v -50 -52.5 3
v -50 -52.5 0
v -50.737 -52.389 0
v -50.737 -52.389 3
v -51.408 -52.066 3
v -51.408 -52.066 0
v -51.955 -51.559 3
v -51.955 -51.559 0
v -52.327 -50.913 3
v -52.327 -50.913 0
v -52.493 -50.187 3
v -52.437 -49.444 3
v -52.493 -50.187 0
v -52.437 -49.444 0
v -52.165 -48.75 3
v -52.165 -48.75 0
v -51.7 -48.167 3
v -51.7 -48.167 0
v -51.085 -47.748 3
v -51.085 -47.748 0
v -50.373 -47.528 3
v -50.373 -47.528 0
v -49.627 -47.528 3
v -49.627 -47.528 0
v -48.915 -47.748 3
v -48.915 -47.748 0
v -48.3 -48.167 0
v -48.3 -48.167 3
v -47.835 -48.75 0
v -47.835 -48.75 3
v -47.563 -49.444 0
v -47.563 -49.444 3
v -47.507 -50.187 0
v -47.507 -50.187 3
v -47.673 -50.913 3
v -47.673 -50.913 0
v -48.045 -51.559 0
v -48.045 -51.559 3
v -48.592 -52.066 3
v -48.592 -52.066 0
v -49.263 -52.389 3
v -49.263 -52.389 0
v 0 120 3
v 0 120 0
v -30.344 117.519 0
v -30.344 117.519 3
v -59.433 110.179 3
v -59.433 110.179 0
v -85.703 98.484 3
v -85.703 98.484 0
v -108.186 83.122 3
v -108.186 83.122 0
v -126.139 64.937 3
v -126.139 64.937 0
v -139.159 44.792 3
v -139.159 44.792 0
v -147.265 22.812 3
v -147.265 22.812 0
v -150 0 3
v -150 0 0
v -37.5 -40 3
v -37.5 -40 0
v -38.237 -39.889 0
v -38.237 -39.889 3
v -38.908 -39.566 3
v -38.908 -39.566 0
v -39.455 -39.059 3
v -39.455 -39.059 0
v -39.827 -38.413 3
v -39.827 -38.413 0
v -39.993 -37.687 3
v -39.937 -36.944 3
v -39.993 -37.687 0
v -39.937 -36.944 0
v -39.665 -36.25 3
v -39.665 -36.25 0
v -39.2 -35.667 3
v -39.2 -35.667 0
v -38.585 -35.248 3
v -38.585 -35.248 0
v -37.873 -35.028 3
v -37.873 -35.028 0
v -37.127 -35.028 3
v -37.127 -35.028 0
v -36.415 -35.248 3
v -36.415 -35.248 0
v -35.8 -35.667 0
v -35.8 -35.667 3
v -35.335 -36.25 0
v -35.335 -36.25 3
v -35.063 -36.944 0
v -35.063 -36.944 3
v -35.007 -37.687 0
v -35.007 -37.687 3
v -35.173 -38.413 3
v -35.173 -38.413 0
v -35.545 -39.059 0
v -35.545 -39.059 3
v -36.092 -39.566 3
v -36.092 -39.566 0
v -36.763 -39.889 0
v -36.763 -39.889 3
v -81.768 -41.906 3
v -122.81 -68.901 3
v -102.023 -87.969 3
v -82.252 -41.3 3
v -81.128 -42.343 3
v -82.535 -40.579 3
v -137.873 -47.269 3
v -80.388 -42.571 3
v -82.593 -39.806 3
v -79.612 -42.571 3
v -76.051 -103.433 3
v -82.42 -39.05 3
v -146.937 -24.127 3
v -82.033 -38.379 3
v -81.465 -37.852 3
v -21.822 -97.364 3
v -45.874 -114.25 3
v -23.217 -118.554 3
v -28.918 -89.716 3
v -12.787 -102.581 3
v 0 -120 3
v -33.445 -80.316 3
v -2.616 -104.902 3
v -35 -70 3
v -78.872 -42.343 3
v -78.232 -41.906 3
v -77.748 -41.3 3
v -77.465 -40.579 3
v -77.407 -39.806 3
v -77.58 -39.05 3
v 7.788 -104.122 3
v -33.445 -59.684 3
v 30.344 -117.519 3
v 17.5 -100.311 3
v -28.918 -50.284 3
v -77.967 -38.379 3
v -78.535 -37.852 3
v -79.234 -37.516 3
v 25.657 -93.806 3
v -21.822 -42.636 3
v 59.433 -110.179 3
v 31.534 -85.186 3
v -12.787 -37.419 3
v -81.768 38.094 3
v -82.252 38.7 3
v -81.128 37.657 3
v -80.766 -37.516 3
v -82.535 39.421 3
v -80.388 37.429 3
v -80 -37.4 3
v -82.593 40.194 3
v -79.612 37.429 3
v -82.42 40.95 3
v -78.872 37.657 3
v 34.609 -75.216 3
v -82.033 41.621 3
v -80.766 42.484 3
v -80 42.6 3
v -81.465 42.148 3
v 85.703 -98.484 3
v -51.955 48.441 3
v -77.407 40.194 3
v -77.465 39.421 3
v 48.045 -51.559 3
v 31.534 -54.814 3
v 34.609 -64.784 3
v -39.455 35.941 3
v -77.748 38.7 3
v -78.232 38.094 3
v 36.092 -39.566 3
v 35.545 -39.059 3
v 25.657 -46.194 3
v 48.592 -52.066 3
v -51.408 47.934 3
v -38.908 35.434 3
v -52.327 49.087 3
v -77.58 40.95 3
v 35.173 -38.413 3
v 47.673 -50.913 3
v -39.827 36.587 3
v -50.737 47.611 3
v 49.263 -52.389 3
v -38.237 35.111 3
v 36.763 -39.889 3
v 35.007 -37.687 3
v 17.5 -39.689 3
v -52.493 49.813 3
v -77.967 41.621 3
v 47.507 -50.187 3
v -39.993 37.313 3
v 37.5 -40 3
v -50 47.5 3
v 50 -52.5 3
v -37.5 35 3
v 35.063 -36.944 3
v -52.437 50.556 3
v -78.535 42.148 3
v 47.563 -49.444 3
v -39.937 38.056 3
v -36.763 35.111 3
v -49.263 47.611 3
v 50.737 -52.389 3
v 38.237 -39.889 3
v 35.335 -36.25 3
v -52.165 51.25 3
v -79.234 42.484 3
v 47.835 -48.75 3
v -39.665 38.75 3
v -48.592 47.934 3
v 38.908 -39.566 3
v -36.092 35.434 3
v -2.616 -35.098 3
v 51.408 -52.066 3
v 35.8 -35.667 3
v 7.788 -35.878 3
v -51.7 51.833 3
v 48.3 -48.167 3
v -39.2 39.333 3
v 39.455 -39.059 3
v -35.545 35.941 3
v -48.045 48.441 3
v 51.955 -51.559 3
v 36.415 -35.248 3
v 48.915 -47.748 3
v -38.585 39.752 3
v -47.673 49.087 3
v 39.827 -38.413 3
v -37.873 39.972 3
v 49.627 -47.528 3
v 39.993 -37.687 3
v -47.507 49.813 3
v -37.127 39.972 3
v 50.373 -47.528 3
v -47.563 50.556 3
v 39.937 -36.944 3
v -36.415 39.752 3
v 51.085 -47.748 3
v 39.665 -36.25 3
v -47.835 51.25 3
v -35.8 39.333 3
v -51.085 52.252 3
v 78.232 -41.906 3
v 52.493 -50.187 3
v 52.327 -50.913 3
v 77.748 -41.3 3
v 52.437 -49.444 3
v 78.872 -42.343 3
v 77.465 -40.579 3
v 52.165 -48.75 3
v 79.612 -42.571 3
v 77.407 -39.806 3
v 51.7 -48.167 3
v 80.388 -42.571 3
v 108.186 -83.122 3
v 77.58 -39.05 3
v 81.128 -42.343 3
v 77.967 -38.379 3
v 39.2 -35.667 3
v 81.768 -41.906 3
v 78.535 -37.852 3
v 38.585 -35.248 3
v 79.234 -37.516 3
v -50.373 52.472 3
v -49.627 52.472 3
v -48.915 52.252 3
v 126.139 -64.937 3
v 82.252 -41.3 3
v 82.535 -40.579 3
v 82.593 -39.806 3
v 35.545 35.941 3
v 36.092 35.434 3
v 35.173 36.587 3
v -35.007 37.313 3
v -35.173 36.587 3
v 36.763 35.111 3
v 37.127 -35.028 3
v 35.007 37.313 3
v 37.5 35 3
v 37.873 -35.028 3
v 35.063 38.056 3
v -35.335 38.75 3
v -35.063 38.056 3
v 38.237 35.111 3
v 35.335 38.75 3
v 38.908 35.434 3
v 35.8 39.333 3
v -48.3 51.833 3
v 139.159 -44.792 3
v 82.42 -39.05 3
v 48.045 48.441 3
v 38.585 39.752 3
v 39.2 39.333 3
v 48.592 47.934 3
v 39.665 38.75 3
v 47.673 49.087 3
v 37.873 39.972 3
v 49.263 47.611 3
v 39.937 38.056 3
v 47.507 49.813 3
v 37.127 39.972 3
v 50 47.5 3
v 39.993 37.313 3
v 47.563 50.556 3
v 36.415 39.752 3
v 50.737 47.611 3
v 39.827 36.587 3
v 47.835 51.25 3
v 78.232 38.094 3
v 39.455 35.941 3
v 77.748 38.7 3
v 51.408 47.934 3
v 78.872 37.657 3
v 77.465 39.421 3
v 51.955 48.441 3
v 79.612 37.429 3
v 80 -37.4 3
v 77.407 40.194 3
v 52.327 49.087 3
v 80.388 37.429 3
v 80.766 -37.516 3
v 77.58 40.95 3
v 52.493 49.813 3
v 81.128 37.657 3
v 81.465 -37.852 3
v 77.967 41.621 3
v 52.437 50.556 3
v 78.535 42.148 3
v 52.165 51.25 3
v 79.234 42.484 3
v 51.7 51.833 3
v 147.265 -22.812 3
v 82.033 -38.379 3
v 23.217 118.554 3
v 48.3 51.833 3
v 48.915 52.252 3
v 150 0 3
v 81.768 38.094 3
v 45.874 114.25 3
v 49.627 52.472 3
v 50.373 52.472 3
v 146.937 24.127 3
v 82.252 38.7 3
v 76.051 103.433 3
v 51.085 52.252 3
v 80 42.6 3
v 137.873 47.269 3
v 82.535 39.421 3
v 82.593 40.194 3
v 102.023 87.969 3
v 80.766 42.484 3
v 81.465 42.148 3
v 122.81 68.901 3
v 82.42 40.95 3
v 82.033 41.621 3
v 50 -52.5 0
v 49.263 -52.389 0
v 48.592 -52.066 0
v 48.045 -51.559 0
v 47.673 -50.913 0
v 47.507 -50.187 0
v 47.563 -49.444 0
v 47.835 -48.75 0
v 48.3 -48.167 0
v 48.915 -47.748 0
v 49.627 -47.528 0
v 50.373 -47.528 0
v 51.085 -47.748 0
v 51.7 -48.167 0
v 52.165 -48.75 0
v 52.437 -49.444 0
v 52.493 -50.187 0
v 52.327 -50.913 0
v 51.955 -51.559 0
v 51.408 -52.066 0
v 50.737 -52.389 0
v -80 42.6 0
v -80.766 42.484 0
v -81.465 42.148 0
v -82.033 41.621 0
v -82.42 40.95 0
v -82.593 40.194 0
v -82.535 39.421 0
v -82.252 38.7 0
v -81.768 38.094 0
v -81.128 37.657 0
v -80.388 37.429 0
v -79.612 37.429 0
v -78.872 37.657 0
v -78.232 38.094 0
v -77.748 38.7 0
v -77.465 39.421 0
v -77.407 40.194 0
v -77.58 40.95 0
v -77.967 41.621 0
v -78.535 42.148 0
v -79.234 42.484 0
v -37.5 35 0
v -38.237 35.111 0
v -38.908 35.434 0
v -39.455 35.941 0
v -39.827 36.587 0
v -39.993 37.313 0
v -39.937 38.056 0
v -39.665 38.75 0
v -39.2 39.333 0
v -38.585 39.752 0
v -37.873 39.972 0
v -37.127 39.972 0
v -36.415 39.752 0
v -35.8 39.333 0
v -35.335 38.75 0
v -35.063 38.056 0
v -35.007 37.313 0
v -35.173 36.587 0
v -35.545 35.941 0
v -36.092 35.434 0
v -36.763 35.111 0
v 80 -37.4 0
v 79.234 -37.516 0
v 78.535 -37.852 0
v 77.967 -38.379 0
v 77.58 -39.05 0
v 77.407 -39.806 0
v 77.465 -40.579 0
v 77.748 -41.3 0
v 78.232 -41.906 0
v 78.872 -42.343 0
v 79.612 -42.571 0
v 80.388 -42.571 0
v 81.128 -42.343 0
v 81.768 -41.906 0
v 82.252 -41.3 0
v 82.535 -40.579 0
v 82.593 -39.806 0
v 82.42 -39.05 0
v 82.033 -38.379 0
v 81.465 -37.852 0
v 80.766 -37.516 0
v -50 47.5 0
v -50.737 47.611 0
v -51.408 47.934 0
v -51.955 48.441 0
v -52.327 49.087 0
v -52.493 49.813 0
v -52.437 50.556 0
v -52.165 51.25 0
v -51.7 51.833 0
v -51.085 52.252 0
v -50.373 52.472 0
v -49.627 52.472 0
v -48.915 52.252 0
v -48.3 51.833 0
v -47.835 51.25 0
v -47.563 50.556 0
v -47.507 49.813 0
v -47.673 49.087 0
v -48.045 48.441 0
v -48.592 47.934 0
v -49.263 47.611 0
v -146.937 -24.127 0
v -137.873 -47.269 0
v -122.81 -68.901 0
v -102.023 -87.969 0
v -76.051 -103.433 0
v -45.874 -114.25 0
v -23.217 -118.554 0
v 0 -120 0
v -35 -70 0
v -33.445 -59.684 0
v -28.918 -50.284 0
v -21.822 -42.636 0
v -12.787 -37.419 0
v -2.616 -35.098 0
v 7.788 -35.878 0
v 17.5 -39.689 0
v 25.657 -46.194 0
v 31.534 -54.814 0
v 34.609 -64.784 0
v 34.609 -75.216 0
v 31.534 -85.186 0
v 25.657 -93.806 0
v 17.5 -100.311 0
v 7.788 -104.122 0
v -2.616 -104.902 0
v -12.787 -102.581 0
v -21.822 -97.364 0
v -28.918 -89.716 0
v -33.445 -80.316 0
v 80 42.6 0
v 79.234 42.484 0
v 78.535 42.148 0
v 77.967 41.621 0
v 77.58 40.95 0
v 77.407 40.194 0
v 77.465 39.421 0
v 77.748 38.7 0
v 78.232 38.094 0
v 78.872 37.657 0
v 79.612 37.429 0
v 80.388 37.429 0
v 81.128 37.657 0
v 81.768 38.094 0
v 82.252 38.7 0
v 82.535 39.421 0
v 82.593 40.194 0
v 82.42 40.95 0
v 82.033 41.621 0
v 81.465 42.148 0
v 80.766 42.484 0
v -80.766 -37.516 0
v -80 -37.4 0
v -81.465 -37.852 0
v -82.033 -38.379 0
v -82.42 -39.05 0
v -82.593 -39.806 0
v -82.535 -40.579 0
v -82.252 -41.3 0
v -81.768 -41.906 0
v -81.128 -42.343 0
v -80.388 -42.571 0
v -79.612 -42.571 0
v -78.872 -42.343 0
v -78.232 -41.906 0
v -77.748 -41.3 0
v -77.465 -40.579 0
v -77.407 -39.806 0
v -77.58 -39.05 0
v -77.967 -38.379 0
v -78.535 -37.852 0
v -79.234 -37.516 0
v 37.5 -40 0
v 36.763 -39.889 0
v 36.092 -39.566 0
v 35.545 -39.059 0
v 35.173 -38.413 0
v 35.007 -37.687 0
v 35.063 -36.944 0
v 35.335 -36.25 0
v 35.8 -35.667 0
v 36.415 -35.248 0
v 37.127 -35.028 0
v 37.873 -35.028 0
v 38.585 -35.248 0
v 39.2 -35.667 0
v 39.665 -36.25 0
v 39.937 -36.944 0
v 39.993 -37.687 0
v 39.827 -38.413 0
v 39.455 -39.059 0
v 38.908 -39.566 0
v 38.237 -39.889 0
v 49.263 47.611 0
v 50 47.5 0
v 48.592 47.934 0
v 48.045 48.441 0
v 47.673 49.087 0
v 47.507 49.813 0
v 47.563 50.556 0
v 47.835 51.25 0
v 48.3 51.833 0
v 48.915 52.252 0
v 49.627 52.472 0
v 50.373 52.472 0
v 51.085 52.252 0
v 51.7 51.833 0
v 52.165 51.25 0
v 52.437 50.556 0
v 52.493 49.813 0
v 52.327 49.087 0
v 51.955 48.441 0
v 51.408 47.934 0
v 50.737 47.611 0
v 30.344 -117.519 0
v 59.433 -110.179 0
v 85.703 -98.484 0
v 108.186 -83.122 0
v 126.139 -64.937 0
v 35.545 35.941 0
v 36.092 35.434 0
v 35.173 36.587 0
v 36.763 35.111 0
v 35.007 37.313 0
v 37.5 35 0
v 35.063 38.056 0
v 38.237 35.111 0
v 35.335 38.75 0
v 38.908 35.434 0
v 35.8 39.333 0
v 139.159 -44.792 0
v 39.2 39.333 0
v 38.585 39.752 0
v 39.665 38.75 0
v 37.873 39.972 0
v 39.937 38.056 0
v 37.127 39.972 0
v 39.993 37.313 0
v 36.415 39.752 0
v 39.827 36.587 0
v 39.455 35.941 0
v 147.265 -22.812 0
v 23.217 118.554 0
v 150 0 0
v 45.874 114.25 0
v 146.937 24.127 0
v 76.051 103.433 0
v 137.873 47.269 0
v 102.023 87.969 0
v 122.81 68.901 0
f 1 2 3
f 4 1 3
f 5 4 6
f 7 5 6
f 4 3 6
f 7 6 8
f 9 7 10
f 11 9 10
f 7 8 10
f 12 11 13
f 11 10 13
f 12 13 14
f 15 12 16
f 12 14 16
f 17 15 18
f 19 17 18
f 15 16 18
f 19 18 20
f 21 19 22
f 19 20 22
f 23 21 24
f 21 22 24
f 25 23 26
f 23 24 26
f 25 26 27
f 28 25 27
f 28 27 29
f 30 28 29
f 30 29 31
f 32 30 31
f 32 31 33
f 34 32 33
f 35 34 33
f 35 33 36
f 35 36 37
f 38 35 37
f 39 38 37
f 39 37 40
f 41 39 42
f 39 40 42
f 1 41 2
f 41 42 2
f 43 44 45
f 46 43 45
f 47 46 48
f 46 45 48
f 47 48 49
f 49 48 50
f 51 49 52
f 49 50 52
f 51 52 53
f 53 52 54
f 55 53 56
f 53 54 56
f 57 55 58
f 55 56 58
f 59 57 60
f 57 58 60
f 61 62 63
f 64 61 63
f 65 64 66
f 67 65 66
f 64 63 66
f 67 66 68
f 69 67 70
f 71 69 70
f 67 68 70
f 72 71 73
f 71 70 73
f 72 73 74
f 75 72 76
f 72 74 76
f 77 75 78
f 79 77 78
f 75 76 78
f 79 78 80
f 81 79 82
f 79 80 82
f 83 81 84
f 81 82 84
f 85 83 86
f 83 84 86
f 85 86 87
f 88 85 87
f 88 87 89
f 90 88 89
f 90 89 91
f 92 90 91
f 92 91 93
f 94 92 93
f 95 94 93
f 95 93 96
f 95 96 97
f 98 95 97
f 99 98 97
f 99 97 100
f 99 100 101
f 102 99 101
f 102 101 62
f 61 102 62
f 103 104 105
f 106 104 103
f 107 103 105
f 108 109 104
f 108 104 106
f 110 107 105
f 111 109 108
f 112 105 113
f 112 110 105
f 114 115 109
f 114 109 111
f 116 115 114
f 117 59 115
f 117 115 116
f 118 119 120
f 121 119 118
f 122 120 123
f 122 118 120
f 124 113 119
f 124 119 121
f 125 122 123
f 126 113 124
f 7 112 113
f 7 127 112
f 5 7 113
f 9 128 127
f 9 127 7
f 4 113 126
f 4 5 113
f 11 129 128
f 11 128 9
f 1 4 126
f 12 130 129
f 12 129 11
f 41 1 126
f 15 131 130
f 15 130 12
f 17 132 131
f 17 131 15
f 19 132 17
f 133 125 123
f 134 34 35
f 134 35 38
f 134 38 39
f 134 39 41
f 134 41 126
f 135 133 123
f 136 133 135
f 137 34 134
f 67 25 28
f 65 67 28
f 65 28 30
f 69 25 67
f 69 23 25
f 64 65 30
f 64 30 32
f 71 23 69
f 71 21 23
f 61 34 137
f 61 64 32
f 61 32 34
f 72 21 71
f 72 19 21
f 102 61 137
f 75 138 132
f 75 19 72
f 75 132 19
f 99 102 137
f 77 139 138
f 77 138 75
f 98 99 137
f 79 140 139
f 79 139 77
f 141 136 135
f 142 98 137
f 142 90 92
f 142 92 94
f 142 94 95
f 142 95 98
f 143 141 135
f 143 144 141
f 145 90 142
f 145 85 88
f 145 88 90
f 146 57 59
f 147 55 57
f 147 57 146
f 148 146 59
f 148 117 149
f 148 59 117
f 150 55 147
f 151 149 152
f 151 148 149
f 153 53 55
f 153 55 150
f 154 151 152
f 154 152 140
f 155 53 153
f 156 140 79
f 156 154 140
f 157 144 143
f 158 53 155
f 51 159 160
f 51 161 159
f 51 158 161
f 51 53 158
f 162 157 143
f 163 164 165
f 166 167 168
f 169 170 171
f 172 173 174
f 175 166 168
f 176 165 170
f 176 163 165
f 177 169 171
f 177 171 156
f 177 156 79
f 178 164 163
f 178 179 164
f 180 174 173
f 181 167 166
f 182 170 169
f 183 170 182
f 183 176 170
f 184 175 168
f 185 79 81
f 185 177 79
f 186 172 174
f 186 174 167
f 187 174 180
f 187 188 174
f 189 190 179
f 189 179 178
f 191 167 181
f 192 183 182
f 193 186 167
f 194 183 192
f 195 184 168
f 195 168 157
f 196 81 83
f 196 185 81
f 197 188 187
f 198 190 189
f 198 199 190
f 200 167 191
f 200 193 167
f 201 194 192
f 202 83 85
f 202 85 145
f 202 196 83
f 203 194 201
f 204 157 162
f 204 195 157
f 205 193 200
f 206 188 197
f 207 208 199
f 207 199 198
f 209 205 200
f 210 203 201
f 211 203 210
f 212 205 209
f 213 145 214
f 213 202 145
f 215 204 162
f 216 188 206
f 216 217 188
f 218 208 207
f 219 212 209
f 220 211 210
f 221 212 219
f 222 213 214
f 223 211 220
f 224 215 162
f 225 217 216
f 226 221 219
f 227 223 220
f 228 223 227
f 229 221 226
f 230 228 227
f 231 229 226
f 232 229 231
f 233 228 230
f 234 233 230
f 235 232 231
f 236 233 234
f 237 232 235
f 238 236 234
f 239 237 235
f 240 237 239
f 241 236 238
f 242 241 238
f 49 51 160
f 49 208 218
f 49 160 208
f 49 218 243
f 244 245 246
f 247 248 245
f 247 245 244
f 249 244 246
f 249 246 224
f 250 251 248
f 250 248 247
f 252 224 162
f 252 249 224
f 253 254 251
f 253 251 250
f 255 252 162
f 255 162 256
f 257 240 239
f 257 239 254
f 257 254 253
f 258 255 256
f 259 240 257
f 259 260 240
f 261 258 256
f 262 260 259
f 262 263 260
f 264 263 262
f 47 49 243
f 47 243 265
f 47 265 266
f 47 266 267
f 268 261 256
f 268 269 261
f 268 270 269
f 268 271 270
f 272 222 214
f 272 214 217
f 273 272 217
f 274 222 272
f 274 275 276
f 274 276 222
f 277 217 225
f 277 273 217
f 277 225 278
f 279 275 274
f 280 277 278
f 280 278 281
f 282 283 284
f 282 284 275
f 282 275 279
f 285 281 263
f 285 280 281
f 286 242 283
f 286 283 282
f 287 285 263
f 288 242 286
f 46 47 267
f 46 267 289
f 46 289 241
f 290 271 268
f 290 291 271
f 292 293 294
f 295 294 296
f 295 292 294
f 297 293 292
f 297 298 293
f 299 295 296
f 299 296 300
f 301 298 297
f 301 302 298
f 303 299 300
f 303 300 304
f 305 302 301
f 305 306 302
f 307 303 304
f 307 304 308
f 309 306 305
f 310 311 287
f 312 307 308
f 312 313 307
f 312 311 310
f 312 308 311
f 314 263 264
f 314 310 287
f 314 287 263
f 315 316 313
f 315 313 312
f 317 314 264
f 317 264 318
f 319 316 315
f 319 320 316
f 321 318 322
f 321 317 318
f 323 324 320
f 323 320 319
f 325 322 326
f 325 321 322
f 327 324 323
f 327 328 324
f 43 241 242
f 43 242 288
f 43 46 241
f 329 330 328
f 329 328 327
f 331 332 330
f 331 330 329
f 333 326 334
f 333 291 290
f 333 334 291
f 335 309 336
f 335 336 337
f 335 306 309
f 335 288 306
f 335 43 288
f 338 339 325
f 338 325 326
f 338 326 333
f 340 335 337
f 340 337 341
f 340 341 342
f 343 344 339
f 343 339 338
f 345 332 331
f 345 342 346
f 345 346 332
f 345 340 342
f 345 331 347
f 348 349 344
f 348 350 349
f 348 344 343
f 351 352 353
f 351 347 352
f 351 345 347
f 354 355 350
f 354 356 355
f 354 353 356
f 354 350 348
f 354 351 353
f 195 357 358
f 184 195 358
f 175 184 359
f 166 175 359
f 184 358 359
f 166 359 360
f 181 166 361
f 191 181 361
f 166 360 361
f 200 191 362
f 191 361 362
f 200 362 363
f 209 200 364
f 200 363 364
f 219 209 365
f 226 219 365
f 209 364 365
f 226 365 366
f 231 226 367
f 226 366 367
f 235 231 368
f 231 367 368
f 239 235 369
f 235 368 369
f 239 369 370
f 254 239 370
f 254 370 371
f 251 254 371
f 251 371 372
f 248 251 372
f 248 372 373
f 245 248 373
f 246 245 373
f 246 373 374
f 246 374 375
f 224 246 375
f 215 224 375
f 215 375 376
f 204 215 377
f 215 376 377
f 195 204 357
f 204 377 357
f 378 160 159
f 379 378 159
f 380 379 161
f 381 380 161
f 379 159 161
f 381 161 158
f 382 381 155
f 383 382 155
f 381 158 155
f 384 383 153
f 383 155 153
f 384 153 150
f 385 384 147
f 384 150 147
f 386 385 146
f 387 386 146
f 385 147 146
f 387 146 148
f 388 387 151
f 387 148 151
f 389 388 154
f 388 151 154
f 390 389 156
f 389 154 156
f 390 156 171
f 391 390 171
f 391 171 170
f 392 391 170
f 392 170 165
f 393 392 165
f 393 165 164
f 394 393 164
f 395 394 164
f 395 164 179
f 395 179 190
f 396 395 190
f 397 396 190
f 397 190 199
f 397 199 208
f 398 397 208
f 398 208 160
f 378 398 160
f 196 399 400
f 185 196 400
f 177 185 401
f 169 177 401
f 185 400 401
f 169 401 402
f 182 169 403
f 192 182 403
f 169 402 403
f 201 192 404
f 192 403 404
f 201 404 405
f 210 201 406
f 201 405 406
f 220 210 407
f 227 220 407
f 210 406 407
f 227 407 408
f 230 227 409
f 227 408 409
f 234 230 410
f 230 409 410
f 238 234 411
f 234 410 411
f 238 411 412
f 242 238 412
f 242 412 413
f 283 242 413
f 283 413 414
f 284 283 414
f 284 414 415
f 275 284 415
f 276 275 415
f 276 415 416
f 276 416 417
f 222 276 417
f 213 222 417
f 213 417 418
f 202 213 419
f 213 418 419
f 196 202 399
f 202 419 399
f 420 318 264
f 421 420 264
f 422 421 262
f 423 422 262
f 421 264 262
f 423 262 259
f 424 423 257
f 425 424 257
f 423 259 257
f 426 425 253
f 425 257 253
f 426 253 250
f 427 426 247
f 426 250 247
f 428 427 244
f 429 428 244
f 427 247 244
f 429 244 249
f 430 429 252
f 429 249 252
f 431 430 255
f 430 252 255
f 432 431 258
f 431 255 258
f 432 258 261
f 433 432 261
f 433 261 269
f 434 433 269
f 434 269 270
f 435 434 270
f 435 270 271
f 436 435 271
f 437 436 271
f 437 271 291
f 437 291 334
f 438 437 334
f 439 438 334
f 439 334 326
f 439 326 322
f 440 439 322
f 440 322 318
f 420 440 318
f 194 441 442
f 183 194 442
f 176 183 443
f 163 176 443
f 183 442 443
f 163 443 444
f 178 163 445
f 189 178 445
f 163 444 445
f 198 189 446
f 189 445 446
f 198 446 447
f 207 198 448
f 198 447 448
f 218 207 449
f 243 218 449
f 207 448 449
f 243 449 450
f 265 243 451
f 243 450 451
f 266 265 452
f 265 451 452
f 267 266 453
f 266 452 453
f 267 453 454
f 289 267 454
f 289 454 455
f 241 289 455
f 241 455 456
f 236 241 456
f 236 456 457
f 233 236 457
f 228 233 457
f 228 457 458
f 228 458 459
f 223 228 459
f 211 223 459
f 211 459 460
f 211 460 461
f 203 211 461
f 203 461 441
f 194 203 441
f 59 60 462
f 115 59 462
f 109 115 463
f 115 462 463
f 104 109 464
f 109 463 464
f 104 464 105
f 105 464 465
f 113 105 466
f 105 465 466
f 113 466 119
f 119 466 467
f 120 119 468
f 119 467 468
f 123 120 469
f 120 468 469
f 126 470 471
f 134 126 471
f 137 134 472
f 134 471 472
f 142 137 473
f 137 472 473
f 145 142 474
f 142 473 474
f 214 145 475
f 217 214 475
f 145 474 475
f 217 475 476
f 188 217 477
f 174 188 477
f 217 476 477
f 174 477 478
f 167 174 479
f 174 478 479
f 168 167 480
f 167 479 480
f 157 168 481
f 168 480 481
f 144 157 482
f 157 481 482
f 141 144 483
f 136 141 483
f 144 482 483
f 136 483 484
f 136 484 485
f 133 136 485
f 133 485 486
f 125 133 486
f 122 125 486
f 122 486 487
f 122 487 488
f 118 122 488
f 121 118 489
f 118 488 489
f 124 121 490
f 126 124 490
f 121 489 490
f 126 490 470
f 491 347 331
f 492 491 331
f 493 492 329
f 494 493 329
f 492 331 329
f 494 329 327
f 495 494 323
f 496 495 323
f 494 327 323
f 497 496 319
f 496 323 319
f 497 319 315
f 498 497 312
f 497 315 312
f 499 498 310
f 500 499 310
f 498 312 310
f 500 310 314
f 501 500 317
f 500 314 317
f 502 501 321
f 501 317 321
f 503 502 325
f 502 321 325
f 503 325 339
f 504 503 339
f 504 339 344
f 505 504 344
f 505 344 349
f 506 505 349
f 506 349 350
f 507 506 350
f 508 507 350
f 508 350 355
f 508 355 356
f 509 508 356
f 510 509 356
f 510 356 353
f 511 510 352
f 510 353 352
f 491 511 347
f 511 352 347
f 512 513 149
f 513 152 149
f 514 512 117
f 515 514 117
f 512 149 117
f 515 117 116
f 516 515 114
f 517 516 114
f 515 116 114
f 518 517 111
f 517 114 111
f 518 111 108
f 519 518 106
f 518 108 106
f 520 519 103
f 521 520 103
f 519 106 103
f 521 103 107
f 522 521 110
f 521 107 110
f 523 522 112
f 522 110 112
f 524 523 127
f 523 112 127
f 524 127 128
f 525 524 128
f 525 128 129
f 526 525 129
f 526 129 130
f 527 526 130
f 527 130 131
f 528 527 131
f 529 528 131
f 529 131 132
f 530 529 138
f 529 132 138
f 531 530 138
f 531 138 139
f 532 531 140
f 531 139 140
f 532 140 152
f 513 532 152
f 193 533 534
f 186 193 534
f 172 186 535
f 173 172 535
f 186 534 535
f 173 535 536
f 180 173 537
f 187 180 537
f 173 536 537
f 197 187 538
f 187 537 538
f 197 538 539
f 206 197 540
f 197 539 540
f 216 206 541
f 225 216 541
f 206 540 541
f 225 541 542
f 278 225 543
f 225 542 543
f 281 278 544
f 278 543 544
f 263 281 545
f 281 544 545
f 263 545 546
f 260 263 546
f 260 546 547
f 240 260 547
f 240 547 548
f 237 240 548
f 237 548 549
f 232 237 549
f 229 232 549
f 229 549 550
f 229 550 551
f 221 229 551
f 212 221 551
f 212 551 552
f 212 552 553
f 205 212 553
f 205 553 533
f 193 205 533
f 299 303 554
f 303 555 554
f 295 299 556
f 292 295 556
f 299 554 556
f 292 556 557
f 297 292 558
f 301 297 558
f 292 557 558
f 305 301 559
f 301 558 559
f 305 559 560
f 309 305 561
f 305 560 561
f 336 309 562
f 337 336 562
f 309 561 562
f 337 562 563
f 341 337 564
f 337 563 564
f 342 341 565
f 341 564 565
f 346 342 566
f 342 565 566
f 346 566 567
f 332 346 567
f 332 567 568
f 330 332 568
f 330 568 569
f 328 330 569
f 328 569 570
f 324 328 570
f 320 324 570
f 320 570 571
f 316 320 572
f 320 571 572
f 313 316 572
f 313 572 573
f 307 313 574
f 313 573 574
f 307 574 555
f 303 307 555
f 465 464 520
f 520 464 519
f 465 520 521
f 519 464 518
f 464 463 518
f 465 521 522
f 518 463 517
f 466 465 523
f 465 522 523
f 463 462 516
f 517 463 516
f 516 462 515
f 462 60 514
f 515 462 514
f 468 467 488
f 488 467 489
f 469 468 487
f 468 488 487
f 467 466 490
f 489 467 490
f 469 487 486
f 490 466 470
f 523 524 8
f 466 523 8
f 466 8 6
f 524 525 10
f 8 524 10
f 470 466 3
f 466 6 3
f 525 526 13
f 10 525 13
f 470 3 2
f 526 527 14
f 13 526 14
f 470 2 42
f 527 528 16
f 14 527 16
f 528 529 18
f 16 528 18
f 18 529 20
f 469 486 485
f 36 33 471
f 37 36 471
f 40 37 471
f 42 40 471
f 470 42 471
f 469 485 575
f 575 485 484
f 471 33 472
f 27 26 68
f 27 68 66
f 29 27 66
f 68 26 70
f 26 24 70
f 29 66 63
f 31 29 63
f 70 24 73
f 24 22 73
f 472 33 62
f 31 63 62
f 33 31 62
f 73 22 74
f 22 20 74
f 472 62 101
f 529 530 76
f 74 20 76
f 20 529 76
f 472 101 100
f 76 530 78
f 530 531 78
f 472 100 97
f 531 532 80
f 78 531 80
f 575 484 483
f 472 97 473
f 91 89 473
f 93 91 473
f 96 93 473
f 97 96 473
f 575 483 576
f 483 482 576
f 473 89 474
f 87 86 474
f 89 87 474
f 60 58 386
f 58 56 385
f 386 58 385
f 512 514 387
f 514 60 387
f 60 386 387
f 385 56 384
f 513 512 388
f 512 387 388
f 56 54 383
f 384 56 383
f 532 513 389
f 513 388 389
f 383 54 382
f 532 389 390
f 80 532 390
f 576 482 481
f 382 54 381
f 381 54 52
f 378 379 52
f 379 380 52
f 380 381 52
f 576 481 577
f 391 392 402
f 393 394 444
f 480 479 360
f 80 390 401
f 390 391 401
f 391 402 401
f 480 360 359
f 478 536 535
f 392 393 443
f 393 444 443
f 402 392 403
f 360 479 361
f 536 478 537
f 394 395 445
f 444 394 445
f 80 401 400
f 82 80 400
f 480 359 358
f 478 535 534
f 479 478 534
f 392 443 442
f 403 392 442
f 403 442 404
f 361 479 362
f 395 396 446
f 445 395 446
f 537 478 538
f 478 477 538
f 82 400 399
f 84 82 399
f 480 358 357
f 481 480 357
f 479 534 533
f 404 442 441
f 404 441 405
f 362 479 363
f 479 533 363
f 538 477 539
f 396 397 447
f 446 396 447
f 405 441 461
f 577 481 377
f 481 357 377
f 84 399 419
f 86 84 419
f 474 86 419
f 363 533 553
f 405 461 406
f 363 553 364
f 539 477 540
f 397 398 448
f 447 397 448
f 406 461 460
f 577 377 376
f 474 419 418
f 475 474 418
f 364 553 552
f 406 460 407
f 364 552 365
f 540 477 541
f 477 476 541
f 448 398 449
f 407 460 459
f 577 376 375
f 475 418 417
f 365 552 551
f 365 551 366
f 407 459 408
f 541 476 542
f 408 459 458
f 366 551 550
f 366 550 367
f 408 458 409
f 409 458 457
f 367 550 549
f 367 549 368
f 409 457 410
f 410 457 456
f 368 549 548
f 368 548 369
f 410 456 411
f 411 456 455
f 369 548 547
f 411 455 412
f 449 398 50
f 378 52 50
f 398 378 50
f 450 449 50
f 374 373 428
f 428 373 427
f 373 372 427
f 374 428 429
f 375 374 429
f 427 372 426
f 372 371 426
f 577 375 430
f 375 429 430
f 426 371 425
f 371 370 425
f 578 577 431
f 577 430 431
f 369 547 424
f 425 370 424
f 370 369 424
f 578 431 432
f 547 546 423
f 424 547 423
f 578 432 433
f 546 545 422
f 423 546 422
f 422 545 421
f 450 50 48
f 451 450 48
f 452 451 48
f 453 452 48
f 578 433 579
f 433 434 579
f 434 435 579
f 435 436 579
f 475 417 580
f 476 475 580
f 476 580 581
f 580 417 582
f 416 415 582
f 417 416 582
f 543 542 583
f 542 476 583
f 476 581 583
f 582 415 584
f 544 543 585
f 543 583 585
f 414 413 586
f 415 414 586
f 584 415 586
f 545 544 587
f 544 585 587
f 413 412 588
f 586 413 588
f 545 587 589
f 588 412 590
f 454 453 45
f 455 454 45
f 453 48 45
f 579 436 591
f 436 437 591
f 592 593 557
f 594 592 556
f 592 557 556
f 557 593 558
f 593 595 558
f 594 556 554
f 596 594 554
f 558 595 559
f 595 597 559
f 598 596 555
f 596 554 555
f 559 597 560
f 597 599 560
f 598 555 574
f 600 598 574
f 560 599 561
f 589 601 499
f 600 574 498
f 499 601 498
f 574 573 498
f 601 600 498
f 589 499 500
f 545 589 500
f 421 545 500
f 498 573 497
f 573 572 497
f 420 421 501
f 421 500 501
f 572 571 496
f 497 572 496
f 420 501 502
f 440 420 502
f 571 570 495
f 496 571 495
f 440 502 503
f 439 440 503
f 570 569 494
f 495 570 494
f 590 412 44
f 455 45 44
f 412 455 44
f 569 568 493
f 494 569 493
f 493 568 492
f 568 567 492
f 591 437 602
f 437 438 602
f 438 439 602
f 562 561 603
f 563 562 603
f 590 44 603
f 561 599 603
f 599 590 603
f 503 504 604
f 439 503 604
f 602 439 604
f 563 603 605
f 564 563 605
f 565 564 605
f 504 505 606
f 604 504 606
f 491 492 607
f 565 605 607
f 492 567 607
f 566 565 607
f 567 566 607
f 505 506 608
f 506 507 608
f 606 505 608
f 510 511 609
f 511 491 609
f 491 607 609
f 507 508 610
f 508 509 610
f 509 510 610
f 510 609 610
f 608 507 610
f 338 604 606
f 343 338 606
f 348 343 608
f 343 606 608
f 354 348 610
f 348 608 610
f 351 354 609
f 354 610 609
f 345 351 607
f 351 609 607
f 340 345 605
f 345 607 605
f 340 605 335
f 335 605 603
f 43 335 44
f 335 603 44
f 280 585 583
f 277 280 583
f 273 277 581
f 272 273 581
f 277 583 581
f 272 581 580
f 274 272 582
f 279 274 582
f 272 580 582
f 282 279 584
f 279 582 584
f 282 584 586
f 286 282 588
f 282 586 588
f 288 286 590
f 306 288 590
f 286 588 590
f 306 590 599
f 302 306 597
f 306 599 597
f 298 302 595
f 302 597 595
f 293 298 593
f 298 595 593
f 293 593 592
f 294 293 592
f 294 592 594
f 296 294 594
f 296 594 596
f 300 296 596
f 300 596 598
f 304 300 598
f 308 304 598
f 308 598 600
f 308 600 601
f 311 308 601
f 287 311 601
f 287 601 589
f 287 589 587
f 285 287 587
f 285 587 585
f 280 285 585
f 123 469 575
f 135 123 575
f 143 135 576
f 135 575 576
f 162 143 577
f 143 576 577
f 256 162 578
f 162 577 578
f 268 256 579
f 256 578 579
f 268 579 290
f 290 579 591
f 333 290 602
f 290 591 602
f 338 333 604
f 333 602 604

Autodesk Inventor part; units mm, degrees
ref_plane "YZ Plane" through (0, 0, 0) normal (1, 0, 0) x (0, 1, 0)
ref_plane "XZ Plane" through (0, 0, 0) normal (0, 1, 0) x (-1, 0, 0)
ref_plane "XY Plane" through (0, 0, 0) normal (0, 0, 1) x (1, 0, 0)
sketch "Skizze1" plane through (0, 0, 0) normal (0, 0, 1) x (1, 0, 0)
  line L0 (-210, 0) -> (210, 0) projected
  line L1 (0, -168) -> (0, 168) projected
  ellipse E0 centre (0, 0) end of major axis (-150, 0) minor radius 120
  line L2 (0, 120) -> (0, -120) construction
  line L3 (-150, 0) -> (150, 0) construction
  dimension "d0" = 300
  dimension "d1" = 240
extrude "Extrusion1" add sketch "Skizze1" along normal blind 3
sketch "Skizze4" plane through (0, 0, 0) normal (0, 0, -1) x (-1, 0, 0)
  line L0 (210, 0) -> (-210, 0) projected
  line L1 (0, -168) -> (0, 168) projected
  line L2 (80, -40) -> (-80, -40)
  line L3 (-80, -40) -> (-80, 40)
  line L4 (-80, 40) -> (80, 40)
  line L5 (80, 40) -> (80, -40)
  line L6 (80, -40) -> (-80, 40) construction
  line L7 (-80, -40) -> (80, 40) construction
  point P0 (0, 0)
  dimension "d25" = 80
  dimension "d26" = 160
hole "Bohrung2" at (80, 40, 0) at (80, -40, 0) at (-80, -40, 0) at (-80, 40, 0) direction (0, 0, 1) diameter 5.2 end through all
sketch "Skizze5" plane through (0, 0, 0) normal (0, 0, -1) x (-1, 0, 0)
  circle A0 centre (0, -70) radius 35 projected
  point P0 (0, 0)
extrude "Extrusion3" cut sketch "Skizze5" against normal through all
sketch "Skizze6" plane through (0, 0, 3) normal (0, 0, 1) x (1, 0, 0)
  line L0 (37.5, -37.5) -> (-37.5, -37.5)
  line L1 (-37.5, -37.5) -> (-37.5, 37.5)
  line L2 (-37.5, 37.5) -> (37.5, 37.5)
  line L3 (37.5, 37.5) -> (37.5, -37.5)
  line L4 (37.5, -37.5) -> (-37.5, 37.5) construction
  line L5 (-37.5, -37.5) -> (37.5, 37.5) construction
  line L6 (50, -50) -> (-50, -50)
  line L7 (-50, -50) -> (-50, 50)
  line L8 (-50, 50) -> (50, 50)
  line L9 (50, 50) -> (50, -50)
  line L10 (50, -50) -> (-50, 50) construction
  line L11 (-50, -50) -> (50, 50) construction
  point P0 (0, 0)
  dimension "d36" = 100
  dimension "d37" = 100
  dimension "d38" = 75
hole "Bohrung3" at (-50, 50, 3) at (-37.5, 37.5, 3) at (37.5, 37.5, 3) at (50, 50, 3) at (50, -50, 3) at (37.5, -37.5, 3) at (-37.5, -37.5, 3) at (-50, -50, 3) direction (0, 0, -1) diameter 5 end through all
equation "\"d37\" = d36"
properties part number "24_0497_0015" material "LCP-Kunststoff"
